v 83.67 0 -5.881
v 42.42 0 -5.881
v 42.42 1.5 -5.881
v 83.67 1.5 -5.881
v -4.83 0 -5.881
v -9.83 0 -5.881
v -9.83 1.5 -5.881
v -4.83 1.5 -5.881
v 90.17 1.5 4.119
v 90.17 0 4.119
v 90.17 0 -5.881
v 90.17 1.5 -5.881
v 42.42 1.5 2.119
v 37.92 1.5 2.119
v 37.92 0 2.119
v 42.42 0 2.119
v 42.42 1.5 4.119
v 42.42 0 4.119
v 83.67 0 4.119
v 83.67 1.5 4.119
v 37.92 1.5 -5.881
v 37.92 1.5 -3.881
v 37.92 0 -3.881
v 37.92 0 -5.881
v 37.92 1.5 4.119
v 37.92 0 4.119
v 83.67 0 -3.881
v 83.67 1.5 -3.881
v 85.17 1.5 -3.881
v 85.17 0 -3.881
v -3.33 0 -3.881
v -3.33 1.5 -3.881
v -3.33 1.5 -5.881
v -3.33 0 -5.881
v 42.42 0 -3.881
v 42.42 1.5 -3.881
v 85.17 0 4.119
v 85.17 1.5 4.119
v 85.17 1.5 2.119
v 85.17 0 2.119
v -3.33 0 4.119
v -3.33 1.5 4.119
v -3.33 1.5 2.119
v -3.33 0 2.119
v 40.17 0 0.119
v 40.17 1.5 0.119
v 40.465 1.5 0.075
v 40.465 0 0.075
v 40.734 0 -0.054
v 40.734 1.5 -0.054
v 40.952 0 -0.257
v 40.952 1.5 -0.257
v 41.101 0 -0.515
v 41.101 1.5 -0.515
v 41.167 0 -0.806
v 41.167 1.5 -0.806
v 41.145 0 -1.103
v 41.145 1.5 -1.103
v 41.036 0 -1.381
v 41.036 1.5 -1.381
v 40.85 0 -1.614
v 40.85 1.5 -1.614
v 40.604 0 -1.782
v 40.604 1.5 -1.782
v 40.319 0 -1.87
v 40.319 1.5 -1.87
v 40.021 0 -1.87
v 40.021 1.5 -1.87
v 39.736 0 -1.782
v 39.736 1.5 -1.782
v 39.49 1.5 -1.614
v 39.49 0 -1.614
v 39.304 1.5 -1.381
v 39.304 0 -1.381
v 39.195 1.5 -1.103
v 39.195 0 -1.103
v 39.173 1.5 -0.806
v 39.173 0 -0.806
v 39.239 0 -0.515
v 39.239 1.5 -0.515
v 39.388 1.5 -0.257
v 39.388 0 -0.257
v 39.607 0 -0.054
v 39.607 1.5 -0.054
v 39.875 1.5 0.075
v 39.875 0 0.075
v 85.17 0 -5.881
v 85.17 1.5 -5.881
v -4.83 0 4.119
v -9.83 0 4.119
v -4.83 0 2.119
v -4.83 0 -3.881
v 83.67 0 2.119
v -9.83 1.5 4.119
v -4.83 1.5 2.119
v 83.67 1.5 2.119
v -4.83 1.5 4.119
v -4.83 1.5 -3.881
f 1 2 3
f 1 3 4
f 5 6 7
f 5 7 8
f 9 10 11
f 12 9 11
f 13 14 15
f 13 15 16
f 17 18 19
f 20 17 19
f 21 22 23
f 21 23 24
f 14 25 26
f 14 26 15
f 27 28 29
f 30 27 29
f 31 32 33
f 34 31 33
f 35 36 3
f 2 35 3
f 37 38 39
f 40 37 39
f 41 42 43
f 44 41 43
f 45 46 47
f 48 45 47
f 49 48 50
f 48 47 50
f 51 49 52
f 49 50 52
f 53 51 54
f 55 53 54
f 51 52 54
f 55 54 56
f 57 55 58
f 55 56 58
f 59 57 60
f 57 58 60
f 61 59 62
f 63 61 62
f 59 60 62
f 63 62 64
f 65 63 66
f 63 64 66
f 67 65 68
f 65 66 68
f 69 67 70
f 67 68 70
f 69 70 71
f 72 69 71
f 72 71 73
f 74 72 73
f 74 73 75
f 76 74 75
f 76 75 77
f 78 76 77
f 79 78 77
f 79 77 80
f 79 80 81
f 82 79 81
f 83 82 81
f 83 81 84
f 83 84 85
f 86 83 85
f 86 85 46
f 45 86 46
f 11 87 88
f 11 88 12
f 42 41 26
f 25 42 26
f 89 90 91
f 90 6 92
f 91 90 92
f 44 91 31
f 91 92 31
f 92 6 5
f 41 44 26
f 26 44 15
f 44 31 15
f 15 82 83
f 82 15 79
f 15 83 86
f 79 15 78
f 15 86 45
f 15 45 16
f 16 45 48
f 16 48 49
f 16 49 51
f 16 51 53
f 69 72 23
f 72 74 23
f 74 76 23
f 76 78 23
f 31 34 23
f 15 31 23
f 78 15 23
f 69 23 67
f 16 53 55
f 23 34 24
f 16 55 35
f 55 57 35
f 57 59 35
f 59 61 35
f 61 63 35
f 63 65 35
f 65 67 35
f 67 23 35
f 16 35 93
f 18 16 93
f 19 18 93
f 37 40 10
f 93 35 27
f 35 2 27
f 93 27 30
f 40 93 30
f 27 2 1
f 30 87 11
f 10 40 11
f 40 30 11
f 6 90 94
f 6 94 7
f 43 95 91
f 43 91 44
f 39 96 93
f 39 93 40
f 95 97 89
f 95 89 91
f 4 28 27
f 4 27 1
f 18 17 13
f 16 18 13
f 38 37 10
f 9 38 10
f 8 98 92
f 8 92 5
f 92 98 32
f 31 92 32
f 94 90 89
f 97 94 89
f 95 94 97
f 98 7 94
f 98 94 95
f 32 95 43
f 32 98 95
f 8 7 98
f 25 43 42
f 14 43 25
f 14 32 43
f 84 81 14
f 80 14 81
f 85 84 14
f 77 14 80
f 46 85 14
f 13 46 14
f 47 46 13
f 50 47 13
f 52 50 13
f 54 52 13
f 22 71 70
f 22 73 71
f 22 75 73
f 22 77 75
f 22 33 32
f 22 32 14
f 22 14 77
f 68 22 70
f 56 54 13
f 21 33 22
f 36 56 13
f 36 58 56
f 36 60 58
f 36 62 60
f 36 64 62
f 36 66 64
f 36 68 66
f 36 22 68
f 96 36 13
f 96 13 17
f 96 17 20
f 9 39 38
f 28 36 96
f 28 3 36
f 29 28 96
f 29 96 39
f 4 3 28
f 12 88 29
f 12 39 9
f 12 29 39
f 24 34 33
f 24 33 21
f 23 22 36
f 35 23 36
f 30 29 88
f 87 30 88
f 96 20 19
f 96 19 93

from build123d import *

# Parameters (mm, degrees)
SKETCH1_W           = 100
SKETCH1_H           = 10
BOSS_EXTRUDE1_DEPTH = 1.5
SKETCH2_R           = 1
CUT_EXTRUDE2_DEPTH  = 2
SKETCH5_W           = 1.5
SKETCH5_H           = 2
SKETCH5_W_2         = 4.5
CUT_EXTRUDE4_DEPTH  = 2


with BuildPart() as part:
    # Sketch1 → Boss-Extrude1 (new body)
    with BuildSketch(Plane(origin=(0, 0, 0), x_dir=(1, 0, 0), z_dir=(0, 1, 0))):
        with Locations((40.170187286, 0.880693734)):
            Rectangle(SKETCH1_W, SKETCH1_H)
    extrude(amount=BOSS_EXTRUDE1_DEPTH)

    # Sketch2 → Cut-Extrude2 (cut)
    with BuildSketch(Plane(origin=(0, 1.5, 0), x_dir=(1, 0, 0), z_dir=(0, 1, 0))):
        with Locations(Location((40.170187286, 0.880693734, 0), (0, 0, 270))):
            Circle(SKETCH2_R)
    extrude(amount=-CUT_EXTRUDE2_DEPTH, mode=Mode.SUBTRACT)

    # Sketch5 → Cut-Extrude4 (cut)
    with BuildSketch(Plane(origin=(0, 1.5, 0), x_dir=(1, 0, 0), z_dir=(0, 1, 0))):
        with Locations((-4.079812714, 4.880693734)):
            Rectangle(SKETCH5_W, SKETCH5_H)
        with Locations((40.170187286, 4.880693734)):
            Rectangle(SKETCH5_W_2, SKETCH5_H)
        with Locations((84.420187286, 4.880693734)):
            Rectangle(SKETCH5_W, SKETCH5_H)
        with Locations((-4.079812714, -3.119306266)):
            Rectangle(SKETCH5_W, SKETCH5_H)
        with Locations((40.170187286, -3.119306266)):
            Rectangle(SKETCH5_W_2, SKETCH5_H)
        with Locations((84.420187286, -3.119306266)):
            Rectangle(SKETCH5_W, SKETCH5_H)
    extrude(amount=-CUT_EXTRUDE4_DEPTH, mode=Mode.SUBTRACT)


solid = part.part
